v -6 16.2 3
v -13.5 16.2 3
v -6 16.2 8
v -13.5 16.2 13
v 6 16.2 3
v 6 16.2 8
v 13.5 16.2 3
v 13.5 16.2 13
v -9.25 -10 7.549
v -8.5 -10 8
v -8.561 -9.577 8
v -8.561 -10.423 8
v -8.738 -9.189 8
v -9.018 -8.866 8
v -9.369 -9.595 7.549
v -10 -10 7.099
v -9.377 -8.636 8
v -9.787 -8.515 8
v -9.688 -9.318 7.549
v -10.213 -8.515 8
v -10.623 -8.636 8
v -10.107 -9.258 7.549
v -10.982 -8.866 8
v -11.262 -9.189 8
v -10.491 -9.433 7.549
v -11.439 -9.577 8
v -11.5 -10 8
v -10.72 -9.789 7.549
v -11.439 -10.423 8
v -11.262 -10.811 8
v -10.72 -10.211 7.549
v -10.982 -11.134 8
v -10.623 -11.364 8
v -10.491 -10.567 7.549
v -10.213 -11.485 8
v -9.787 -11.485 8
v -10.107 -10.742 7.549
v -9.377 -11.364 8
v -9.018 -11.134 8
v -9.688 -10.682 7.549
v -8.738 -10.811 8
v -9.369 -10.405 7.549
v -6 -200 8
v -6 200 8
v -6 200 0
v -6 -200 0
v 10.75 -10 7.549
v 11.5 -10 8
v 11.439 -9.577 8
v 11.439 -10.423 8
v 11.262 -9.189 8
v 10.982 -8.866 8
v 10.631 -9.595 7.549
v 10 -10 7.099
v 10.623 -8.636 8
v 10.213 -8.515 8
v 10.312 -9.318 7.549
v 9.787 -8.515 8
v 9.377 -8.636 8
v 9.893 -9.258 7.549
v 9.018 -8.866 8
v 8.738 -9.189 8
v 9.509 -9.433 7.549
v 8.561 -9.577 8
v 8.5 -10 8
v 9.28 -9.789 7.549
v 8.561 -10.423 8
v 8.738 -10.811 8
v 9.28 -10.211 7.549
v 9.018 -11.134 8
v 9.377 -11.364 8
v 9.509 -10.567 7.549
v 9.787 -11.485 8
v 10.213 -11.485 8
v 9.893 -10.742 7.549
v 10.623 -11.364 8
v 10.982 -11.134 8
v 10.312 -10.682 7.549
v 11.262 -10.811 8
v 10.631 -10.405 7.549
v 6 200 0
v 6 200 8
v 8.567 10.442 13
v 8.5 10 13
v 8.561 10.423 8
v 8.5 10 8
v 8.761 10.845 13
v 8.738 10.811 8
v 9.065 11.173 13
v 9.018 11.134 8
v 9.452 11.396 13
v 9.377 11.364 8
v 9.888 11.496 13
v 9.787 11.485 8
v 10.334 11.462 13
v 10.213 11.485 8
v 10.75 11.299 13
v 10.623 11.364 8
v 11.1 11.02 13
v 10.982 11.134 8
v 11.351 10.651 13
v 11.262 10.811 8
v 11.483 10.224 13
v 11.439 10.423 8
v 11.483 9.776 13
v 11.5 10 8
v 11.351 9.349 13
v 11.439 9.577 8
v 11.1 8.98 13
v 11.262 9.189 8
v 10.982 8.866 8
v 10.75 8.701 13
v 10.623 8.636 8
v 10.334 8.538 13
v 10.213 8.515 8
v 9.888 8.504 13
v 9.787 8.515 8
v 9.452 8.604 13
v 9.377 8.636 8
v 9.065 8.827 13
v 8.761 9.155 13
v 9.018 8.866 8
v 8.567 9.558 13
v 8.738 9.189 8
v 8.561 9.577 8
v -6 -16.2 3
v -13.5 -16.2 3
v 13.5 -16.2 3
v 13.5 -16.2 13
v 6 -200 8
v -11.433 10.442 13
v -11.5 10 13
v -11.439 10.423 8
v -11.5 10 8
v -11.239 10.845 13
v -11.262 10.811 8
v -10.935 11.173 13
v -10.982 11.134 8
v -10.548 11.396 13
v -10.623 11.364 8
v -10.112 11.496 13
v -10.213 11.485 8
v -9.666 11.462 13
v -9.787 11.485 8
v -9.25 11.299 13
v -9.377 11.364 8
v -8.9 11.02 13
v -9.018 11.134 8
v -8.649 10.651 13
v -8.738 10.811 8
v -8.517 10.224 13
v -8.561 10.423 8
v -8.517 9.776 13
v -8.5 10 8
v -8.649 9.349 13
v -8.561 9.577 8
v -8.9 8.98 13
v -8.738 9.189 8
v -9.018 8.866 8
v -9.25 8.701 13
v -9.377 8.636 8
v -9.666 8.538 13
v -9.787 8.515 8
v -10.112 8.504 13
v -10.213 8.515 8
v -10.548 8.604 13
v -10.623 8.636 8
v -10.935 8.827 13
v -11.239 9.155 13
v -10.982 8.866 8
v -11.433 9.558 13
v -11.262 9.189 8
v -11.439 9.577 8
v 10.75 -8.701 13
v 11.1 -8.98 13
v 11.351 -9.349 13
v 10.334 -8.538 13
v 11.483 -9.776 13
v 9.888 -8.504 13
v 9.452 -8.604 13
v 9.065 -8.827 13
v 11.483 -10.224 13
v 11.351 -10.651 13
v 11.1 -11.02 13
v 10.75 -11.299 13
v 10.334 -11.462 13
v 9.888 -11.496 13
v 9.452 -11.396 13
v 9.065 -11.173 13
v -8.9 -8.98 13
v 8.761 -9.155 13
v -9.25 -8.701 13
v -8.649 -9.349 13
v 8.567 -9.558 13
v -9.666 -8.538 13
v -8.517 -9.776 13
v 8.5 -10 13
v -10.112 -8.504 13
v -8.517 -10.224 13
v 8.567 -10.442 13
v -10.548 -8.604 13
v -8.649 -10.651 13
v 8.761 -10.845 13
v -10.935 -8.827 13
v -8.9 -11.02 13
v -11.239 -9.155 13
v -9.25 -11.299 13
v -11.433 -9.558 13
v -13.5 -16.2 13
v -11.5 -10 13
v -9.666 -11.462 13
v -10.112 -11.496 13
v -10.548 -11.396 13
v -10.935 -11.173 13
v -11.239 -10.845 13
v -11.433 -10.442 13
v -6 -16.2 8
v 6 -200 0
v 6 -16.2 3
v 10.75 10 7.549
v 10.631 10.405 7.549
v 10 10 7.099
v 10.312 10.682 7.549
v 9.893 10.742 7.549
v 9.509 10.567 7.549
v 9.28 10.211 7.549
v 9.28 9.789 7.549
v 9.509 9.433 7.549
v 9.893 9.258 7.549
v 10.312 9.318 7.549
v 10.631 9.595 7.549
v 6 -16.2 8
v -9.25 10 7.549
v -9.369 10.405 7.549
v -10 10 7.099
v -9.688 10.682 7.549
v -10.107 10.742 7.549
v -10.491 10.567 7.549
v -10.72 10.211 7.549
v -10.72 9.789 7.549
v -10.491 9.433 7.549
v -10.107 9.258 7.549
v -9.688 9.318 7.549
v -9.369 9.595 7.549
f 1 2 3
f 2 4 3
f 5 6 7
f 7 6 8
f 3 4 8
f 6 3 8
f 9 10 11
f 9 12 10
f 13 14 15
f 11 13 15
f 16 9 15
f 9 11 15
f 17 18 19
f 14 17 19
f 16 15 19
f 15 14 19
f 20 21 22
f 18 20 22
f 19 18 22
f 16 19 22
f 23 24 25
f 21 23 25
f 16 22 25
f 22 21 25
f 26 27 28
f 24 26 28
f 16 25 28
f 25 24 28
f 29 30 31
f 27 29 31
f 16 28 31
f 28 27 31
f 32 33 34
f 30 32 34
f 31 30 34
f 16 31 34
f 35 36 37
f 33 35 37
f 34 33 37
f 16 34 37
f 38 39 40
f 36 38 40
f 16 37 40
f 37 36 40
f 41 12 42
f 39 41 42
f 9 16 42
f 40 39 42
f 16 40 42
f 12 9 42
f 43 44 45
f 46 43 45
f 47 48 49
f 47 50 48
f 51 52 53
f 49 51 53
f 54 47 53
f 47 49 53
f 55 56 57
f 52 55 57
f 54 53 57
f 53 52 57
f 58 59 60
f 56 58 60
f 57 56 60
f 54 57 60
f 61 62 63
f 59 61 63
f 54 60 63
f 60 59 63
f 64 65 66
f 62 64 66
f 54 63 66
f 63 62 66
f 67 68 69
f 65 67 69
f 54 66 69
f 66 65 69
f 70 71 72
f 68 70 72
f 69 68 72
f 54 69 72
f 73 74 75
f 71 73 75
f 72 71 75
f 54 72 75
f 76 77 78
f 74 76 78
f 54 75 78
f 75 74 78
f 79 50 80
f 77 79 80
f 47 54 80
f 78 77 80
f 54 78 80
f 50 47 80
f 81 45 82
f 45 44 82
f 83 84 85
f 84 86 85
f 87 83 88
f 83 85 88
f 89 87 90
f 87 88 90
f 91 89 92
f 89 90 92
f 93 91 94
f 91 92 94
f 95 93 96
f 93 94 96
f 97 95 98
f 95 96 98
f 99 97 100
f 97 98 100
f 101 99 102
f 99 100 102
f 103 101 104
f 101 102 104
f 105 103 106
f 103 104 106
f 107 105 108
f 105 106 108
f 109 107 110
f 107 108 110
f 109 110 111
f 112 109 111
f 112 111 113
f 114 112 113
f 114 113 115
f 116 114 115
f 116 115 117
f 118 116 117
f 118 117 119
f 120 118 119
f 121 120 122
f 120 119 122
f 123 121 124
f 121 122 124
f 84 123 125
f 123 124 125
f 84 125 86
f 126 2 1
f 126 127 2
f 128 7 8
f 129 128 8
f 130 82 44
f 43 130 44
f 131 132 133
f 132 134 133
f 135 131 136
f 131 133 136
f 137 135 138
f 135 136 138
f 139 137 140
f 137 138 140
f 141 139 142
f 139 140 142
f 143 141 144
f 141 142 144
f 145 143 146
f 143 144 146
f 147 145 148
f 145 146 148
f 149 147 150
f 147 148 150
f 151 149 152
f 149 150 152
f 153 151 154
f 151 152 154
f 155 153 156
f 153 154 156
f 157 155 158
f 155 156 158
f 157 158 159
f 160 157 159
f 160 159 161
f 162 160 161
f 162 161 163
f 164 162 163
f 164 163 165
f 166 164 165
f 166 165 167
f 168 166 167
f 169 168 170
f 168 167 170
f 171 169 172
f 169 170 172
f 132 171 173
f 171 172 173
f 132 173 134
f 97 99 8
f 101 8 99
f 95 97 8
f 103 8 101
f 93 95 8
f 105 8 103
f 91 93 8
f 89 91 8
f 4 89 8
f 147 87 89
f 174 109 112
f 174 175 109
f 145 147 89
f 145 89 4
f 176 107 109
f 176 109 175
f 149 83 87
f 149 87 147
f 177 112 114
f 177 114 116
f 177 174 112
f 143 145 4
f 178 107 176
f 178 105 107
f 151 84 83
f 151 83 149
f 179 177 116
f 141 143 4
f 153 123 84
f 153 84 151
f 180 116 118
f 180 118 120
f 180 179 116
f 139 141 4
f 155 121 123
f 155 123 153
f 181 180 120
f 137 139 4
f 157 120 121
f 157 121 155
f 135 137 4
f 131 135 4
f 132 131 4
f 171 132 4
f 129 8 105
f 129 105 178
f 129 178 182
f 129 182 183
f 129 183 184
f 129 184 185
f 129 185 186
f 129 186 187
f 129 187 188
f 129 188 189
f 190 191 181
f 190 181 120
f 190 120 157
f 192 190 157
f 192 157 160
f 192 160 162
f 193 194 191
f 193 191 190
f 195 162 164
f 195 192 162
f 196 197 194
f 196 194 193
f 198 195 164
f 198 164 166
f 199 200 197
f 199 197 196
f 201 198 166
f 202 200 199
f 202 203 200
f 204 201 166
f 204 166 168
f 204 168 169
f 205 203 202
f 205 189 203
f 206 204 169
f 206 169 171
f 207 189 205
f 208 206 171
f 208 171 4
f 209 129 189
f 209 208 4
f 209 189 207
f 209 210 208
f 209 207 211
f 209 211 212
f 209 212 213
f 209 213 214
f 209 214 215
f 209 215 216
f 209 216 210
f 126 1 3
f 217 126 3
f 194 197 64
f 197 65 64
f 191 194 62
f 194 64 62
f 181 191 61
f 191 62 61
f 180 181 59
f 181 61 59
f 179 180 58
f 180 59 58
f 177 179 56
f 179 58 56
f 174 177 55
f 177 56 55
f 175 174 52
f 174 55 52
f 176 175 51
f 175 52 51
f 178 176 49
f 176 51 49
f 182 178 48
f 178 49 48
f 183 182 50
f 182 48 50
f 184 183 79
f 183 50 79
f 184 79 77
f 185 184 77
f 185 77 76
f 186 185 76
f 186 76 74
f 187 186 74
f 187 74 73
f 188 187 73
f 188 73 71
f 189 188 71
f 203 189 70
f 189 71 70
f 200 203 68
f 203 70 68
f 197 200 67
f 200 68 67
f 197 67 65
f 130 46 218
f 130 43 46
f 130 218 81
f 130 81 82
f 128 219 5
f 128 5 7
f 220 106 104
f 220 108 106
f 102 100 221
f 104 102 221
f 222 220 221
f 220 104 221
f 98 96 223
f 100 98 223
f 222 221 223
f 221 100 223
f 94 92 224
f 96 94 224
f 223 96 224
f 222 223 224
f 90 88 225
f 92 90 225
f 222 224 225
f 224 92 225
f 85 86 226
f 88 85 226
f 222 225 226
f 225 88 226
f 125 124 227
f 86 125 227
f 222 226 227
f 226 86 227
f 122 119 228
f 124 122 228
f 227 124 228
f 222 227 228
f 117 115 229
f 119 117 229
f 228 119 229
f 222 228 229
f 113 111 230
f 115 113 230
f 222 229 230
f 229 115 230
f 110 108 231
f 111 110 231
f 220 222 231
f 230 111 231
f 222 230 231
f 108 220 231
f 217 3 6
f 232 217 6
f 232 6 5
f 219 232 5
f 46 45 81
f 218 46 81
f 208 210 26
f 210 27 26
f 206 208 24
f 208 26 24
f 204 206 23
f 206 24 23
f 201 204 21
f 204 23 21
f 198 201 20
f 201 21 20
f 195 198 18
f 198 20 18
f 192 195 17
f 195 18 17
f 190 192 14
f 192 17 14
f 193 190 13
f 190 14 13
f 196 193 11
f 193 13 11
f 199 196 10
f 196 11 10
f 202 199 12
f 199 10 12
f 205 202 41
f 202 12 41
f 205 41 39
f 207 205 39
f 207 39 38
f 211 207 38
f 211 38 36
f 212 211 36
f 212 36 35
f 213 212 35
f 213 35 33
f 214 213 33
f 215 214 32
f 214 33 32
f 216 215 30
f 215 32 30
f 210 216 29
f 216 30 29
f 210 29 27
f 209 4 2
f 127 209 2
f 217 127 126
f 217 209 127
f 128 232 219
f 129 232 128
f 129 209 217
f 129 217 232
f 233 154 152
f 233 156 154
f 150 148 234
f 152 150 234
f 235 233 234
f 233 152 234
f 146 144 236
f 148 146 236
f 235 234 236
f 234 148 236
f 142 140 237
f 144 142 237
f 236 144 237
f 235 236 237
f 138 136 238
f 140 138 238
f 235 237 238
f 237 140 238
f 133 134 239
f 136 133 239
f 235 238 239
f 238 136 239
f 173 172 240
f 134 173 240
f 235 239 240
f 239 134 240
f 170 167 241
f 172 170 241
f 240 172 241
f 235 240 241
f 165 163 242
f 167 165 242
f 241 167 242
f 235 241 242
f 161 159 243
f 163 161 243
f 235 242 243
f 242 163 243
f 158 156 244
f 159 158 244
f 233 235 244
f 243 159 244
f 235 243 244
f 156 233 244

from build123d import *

# Parameters (mm, degrees)
F1_DEPTH = 200
F2_DEPTH = 16.2
F4_D     = 3
F4_DEPTH = 5
F4_TIP   = 0.9012909285


with BuildPart() as f1:
    # F0 (on Front) → F1 (new body, symmetric)
    with BuildSketch(Plane.XZ):
        Polygon((-6, 3), (-6, 0), (6, 0), (6, 3), (6, 8), (-6, 8), align=None)
    extrude(amount=F1_DEPTH, both=True)


with BuildPart() as f2:
    # F0 (on Front) → F2 (new body, symmetric)
    with BuildSketch(Plane.XZ):
        Polygon((-13.5, 3), (-6, 3), (-6, 8), (6, 8), (6, 3), (13.5, 3), (13.5, 13), (-13.5, 13), align=None)
    extrude(amount=F2_DEPTH, both=True)

    # F4
    with Locations(Plane.XY.offset(13)):
        with Locations((-10, 10), (10, 10), (10, -10), (-10, -10)):
            Hole(F4_D / 2, depth=F4_DEPTH)
            with Locations((0, 0, -(F4_DEPTH + F4_TIP / 2))):  # 118° drill point
                Cone(0, F4_D / 2, F4_TIP, mode=Mode.SUBTRACT)


solid = Compound([f1.part, f2.part])
